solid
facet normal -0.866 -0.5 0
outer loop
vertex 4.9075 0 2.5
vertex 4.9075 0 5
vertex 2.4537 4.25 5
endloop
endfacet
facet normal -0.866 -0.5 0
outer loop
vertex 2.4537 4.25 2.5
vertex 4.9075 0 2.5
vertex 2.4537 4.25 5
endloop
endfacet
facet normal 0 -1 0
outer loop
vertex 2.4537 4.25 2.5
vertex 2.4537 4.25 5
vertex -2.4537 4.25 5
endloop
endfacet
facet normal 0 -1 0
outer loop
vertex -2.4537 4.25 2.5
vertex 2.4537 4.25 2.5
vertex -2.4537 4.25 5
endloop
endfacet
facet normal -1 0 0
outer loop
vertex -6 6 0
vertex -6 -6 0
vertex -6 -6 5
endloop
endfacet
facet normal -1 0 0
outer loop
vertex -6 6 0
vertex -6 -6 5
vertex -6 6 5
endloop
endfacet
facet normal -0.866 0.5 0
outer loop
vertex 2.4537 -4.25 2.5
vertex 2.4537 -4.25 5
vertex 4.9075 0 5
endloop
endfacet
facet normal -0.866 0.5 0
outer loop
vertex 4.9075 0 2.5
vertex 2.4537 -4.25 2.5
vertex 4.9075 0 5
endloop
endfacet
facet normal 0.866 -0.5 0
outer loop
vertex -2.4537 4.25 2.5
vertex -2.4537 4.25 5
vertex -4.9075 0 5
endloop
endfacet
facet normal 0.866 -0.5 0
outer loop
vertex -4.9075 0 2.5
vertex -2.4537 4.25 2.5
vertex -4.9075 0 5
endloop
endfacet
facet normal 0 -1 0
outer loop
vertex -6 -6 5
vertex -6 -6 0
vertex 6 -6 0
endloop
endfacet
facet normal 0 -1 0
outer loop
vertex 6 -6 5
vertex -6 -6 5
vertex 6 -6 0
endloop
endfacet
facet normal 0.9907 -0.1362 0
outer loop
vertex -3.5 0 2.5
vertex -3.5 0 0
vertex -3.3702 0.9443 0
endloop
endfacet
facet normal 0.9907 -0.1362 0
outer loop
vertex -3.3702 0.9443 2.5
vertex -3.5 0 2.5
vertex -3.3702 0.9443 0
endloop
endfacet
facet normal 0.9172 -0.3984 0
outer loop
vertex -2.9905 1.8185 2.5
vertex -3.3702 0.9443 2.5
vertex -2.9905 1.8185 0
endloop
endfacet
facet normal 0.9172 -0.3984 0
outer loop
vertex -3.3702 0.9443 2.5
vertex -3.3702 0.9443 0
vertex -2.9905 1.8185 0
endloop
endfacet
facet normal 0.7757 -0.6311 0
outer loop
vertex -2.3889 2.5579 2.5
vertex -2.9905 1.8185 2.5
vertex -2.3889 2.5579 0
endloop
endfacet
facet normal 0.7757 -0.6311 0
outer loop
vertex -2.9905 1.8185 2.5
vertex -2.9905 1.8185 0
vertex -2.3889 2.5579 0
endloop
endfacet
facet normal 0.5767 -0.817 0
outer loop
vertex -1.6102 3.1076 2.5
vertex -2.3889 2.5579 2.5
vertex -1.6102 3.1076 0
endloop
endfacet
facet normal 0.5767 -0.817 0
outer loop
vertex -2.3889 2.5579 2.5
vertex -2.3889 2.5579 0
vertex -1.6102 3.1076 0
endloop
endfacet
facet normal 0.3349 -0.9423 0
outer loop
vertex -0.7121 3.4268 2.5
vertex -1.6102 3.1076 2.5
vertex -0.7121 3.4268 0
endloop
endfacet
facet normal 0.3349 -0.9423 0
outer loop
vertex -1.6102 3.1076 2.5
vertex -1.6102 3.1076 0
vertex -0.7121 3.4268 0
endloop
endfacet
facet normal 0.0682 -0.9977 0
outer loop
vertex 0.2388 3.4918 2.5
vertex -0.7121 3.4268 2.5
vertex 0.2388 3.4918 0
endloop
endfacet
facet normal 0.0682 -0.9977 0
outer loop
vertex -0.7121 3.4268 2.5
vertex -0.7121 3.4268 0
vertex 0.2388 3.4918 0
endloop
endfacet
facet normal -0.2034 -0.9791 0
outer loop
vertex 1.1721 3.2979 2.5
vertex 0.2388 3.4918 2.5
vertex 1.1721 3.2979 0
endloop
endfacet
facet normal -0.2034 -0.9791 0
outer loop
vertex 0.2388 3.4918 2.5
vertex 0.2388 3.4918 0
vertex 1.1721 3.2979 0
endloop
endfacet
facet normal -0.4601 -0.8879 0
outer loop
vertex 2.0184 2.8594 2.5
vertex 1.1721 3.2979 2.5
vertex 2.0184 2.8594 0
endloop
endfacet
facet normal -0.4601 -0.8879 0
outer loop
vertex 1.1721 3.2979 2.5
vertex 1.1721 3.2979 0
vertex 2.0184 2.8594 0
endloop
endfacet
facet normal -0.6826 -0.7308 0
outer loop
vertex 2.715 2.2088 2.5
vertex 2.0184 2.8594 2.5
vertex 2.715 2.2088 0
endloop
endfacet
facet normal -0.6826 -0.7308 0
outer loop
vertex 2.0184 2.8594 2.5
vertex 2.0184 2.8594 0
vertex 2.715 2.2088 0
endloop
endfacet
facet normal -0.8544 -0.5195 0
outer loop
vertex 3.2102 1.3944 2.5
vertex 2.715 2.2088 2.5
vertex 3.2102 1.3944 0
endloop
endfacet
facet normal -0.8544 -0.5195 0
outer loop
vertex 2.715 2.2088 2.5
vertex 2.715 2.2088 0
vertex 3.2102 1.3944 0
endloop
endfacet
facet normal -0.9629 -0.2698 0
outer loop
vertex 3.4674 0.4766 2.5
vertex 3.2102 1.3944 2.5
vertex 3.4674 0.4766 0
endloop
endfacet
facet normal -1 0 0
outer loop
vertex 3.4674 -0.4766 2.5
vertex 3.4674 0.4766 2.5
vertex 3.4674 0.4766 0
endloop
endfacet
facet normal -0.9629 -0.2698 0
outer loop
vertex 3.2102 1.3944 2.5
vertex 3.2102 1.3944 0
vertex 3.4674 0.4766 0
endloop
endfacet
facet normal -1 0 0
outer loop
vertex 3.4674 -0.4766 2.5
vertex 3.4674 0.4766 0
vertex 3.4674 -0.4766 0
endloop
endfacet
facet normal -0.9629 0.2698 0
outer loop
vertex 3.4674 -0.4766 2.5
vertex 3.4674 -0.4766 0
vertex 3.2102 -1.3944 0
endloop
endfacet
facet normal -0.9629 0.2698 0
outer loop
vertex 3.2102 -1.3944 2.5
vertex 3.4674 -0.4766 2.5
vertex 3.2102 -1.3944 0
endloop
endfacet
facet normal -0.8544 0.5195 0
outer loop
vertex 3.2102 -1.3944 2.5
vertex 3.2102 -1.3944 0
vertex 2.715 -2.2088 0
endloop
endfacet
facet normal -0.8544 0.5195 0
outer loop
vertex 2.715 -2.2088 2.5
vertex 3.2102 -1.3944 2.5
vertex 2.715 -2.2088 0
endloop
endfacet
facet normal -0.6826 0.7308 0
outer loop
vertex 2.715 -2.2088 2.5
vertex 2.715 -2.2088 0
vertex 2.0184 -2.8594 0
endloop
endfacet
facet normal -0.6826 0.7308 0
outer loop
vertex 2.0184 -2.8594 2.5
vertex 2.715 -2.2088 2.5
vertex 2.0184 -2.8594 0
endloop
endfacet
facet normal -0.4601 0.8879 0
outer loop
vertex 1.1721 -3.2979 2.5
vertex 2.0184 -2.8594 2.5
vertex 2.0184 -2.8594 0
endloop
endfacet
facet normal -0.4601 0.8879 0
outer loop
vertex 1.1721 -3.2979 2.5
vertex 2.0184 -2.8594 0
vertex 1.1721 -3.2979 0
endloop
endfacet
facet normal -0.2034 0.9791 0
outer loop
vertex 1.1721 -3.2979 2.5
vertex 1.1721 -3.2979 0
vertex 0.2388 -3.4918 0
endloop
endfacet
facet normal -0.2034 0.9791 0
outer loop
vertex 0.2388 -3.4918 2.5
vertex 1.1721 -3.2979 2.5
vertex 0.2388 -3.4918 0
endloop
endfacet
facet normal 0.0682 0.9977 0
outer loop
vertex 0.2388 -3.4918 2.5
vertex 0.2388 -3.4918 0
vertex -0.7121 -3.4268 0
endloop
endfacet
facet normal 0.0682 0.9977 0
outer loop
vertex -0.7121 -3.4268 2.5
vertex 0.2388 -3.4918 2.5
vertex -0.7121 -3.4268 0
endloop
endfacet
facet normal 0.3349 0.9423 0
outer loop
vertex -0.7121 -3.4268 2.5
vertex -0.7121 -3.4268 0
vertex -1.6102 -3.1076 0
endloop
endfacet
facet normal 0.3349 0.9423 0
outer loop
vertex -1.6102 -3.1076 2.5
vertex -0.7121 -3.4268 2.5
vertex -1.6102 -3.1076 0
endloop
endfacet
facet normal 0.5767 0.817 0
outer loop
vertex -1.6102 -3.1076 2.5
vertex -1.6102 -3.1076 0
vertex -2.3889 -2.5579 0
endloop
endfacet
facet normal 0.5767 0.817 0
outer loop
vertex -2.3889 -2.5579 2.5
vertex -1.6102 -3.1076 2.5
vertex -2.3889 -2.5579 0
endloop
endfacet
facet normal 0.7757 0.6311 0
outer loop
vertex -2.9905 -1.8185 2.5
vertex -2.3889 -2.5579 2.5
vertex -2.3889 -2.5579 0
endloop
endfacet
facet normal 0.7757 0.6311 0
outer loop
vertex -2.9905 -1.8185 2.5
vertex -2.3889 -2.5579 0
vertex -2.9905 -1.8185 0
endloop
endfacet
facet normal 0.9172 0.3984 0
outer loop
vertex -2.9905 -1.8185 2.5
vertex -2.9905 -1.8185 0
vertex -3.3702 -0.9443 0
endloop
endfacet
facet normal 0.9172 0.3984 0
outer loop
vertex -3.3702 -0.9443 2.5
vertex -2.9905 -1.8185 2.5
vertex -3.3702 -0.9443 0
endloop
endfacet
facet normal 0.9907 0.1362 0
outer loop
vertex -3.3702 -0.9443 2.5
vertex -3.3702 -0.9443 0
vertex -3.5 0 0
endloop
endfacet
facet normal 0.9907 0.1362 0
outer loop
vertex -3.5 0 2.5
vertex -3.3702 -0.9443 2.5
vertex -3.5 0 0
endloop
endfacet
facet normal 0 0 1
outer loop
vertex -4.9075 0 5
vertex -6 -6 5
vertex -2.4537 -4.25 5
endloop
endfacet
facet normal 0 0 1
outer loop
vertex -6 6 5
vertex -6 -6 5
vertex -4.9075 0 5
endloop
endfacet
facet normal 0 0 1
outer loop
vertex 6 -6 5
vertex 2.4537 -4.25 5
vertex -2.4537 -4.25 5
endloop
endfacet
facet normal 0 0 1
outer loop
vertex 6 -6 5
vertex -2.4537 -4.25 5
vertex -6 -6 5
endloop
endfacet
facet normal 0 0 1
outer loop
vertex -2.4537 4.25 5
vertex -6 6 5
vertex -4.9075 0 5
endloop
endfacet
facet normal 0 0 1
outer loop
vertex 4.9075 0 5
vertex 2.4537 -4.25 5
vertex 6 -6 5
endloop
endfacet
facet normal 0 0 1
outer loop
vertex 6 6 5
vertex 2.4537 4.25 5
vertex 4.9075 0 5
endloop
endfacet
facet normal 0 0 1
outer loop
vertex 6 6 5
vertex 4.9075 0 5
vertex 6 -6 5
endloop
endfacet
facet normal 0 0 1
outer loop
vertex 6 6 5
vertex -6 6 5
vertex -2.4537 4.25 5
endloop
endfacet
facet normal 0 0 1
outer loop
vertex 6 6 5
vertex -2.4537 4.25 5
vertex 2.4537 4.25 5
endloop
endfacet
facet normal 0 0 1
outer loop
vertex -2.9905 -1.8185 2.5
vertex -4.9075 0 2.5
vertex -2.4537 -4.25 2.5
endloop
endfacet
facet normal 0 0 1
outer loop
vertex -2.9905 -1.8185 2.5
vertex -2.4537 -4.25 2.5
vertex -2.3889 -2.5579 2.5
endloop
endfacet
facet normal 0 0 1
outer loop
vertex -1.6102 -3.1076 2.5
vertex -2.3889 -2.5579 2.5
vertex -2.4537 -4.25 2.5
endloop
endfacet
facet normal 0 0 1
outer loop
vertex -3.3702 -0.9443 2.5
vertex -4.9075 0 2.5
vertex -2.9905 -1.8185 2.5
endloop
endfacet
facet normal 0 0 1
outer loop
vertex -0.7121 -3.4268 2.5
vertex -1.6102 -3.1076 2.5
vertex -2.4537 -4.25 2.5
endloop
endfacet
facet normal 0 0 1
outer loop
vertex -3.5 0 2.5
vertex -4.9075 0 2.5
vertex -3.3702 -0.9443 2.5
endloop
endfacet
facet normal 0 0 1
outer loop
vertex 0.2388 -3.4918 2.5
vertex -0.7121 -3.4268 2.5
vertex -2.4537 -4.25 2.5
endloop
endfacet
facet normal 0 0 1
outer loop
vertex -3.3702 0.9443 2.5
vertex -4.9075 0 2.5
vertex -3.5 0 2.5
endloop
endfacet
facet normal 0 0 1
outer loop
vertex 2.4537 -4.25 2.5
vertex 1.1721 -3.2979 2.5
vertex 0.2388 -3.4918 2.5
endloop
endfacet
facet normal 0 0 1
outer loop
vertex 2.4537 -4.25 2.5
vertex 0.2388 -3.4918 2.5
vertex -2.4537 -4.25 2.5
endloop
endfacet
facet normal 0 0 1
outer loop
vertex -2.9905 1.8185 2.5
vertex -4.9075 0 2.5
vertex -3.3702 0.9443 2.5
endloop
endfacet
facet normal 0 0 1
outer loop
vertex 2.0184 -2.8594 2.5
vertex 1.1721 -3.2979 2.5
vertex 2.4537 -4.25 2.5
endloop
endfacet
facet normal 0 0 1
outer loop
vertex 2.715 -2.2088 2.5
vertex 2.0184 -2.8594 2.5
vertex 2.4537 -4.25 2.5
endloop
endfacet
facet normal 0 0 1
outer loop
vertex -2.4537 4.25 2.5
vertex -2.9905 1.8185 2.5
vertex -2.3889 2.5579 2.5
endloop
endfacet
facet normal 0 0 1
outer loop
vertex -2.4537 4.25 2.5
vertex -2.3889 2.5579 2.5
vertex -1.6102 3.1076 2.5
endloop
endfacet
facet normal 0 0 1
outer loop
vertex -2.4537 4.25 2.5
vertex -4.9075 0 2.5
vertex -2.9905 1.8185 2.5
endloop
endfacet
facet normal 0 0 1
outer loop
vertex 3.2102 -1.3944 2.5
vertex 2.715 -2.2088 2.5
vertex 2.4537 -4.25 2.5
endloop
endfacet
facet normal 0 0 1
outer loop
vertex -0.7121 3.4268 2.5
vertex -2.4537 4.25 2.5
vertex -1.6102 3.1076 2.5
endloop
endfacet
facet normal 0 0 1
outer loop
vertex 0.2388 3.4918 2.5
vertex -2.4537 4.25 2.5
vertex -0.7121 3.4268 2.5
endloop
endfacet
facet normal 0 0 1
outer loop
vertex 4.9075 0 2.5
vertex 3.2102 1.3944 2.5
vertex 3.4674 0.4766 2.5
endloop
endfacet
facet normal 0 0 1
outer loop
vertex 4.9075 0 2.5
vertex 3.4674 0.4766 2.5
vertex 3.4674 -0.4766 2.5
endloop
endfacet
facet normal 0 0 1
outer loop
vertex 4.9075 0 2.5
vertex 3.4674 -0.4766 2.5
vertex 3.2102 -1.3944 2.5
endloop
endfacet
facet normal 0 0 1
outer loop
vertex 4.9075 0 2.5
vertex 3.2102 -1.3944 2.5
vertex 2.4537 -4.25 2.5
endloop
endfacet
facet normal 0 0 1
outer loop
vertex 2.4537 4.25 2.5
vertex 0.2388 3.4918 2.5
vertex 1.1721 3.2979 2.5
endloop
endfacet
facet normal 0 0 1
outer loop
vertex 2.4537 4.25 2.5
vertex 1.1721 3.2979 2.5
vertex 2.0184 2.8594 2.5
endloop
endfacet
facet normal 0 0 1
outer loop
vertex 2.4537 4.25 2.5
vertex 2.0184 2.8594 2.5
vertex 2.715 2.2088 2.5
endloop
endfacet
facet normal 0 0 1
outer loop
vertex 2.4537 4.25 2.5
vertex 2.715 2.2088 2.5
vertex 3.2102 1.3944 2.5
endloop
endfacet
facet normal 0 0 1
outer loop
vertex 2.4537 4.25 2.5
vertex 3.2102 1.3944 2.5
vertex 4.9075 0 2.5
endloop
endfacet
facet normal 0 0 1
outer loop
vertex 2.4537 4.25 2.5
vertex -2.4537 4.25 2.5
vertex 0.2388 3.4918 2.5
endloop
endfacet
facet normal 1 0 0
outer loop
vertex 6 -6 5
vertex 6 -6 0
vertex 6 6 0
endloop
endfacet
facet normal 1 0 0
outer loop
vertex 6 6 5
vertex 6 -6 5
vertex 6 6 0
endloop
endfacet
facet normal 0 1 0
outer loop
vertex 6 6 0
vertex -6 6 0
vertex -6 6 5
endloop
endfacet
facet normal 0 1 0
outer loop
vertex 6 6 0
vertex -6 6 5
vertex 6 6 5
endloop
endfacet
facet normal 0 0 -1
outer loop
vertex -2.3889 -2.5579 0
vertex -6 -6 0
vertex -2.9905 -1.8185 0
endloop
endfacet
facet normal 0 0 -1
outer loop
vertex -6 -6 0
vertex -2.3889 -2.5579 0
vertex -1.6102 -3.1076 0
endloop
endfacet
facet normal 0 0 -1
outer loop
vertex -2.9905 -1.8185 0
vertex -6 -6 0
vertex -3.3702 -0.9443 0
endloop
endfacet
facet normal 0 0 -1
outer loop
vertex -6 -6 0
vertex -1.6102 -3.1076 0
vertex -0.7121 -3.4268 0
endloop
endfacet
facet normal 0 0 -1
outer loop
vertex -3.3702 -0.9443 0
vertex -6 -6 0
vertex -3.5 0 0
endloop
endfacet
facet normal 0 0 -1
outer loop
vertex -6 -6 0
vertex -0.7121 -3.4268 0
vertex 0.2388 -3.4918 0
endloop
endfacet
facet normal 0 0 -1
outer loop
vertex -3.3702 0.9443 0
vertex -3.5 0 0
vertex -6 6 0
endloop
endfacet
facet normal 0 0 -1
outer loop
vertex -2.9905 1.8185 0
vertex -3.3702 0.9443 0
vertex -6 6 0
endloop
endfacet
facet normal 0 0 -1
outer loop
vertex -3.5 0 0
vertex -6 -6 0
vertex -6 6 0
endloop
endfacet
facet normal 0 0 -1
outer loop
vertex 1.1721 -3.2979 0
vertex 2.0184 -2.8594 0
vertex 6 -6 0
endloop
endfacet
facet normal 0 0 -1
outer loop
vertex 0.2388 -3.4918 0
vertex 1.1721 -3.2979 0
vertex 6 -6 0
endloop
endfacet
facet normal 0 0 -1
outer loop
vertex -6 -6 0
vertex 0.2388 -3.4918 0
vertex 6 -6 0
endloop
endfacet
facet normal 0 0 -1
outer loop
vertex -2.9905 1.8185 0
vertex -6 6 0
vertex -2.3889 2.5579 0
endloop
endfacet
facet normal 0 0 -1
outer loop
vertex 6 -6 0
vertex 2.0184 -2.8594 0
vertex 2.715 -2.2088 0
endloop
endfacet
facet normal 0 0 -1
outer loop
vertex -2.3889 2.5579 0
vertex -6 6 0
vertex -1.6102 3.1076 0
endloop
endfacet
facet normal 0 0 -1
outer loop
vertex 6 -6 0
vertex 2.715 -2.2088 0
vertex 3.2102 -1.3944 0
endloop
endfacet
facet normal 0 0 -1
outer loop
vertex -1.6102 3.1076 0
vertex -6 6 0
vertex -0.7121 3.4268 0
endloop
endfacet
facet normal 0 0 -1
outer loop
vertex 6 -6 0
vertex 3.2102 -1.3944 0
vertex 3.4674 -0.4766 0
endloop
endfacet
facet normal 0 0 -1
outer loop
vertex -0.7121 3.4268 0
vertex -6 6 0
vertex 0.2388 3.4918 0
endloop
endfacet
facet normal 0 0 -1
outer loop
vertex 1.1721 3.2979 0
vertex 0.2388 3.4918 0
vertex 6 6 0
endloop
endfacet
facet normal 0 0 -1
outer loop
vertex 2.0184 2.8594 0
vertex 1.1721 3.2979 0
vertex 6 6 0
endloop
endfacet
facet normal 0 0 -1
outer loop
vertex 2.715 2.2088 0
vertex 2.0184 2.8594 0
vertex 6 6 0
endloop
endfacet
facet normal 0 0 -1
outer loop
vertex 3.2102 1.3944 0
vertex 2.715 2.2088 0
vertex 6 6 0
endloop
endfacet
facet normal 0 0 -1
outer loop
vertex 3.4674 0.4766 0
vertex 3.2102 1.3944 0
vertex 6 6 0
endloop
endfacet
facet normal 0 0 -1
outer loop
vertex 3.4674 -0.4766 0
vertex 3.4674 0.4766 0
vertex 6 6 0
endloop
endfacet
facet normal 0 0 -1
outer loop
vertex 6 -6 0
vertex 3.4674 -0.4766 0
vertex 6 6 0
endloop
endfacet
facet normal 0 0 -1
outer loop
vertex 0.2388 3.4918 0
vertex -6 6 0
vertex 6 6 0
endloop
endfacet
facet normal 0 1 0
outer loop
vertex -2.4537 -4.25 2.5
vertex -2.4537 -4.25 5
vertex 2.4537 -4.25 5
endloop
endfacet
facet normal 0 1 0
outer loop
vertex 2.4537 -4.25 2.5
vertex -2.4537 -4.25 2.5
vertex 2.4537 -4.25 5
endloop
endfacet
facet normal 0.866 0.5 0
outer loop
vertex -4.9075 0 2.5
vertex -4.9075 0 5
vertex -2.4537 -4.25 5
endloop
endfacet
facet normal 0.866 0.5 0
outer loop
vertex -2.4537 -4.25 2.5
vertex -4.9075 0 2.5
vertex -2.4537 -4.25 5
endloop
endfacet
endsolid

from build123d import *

# Parameters (mm, degrees)
F0_W     = 12
F0_H     = 12
F1_DEPTH = 5
F3_DEPTH = 2.5
F5_D     = 7


with BuildPart() as f1:
    # F0 (on Top) → F1 (new body)
    with BuildSketch(Plane.XY):
        Rectangle(F0_W, F0_H)
    extrude(amount=F1_DEPTH)

    # F2 (on face) → F3 (cut)
    with BuildSketch(Plane.XY.offset(5)):
        Polygon((2.453739, -4.25), (4.907477, 0), (2.453739, 4.25), (-2.453739, 4.25), (-4.907477, 0), (-2.453739, -4.25), align=None)
    extrude(amount=-F3_DEPTH, mode=Mode.SUBTRACT)

    # F5 (through all)
    with Locations(Plane.XY.offset(2.5)):
        with Locations((0, 0)):
            Hole(F5_D / 2)


solid = f1.part
